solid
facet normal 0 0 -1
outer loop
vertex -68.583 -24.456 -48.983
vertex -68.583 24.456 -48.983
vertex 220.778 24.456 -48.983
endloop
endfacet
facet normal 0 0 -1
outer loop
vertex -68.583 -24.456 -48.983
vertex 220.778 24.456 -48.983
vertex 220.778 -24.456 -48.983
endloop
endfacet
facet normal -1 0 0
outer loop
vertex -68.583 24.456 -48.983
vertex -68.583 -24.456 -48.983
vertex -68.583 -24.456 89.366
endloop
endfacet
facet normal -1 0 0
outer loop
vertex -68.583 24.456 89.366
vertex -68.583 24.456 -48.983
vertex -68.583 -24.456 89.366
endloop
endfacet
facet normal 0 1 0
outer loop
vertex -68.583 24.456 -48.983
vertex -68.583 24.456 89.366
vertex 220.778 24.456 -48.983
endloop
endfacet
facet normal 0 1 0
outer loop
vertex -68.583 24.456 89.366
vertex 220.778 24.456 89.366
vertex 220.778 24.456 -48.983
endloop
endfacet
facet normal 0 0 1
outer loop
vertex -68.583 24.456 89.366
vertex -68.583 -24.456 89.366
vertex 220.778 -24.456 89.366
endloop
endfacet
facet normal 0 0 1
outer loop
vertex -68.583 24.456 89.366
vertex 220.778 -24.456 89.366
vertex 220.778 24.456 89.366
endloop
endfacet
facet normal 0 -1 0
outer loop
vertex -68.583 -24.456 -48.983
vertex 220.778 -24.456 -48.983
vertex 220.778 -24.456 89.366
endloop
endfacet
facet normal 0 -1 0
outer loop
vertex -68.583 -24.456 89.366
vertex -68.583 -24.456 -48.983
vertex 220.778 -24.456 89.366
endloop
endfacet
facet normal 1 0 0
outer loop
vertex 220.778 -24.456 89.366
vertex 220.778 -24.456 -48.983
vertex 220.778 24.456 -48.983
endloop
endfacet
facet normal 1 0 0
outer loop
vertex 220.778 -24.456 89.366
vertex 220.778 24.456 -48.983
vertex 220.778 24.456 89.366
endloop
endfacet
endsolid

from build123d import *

# Parameters (mm, degrees)
F0_W     = 48.3708679676
F0_H     = 97.9666113853
F1_DEPTH = 24.4558788836
F2_DEPTH = 40.3822362423
F3_DEPTH = 51.912009716
F4_DEPTH = 144.6804255247


with BuildPart() as f1:
    # F0 (on Front) → F1 (new body, symmetric)
    with BuildSketch(Plane.XZ):
        Rectangle(F0_W, F0_H)
    extrude(amount=F1_DEPTH, both=True)

    # F2 (add, symmetric): a face of the model
    f2_faces = [f1.faces().sort_by_distance(p)[0] for p in [
        (0, 0, 48.9833056927),
    ]]
    extrude(f2_faces, amount=F2_DEPTH, both=True)

    # F3 (add): a face of the model
    f3_faces = [f1.faces().sort_by_distance(p)[0] for p in [
        (24.1854339838, 0, 20.1911181211),
    ]]
    extrude(f3_faces, amount=F3_DEPTH)

    # F4 (add, symmetric): a face of the model
    f4_faces = [f1.faces().sort_by_distance(p)[0] for p in [
        (76.0974436998, 0, 20.1911181211),
    ]]
    extrude(f4_faces, amount=F4_DEPTH, both=True)


solid = f1.part
